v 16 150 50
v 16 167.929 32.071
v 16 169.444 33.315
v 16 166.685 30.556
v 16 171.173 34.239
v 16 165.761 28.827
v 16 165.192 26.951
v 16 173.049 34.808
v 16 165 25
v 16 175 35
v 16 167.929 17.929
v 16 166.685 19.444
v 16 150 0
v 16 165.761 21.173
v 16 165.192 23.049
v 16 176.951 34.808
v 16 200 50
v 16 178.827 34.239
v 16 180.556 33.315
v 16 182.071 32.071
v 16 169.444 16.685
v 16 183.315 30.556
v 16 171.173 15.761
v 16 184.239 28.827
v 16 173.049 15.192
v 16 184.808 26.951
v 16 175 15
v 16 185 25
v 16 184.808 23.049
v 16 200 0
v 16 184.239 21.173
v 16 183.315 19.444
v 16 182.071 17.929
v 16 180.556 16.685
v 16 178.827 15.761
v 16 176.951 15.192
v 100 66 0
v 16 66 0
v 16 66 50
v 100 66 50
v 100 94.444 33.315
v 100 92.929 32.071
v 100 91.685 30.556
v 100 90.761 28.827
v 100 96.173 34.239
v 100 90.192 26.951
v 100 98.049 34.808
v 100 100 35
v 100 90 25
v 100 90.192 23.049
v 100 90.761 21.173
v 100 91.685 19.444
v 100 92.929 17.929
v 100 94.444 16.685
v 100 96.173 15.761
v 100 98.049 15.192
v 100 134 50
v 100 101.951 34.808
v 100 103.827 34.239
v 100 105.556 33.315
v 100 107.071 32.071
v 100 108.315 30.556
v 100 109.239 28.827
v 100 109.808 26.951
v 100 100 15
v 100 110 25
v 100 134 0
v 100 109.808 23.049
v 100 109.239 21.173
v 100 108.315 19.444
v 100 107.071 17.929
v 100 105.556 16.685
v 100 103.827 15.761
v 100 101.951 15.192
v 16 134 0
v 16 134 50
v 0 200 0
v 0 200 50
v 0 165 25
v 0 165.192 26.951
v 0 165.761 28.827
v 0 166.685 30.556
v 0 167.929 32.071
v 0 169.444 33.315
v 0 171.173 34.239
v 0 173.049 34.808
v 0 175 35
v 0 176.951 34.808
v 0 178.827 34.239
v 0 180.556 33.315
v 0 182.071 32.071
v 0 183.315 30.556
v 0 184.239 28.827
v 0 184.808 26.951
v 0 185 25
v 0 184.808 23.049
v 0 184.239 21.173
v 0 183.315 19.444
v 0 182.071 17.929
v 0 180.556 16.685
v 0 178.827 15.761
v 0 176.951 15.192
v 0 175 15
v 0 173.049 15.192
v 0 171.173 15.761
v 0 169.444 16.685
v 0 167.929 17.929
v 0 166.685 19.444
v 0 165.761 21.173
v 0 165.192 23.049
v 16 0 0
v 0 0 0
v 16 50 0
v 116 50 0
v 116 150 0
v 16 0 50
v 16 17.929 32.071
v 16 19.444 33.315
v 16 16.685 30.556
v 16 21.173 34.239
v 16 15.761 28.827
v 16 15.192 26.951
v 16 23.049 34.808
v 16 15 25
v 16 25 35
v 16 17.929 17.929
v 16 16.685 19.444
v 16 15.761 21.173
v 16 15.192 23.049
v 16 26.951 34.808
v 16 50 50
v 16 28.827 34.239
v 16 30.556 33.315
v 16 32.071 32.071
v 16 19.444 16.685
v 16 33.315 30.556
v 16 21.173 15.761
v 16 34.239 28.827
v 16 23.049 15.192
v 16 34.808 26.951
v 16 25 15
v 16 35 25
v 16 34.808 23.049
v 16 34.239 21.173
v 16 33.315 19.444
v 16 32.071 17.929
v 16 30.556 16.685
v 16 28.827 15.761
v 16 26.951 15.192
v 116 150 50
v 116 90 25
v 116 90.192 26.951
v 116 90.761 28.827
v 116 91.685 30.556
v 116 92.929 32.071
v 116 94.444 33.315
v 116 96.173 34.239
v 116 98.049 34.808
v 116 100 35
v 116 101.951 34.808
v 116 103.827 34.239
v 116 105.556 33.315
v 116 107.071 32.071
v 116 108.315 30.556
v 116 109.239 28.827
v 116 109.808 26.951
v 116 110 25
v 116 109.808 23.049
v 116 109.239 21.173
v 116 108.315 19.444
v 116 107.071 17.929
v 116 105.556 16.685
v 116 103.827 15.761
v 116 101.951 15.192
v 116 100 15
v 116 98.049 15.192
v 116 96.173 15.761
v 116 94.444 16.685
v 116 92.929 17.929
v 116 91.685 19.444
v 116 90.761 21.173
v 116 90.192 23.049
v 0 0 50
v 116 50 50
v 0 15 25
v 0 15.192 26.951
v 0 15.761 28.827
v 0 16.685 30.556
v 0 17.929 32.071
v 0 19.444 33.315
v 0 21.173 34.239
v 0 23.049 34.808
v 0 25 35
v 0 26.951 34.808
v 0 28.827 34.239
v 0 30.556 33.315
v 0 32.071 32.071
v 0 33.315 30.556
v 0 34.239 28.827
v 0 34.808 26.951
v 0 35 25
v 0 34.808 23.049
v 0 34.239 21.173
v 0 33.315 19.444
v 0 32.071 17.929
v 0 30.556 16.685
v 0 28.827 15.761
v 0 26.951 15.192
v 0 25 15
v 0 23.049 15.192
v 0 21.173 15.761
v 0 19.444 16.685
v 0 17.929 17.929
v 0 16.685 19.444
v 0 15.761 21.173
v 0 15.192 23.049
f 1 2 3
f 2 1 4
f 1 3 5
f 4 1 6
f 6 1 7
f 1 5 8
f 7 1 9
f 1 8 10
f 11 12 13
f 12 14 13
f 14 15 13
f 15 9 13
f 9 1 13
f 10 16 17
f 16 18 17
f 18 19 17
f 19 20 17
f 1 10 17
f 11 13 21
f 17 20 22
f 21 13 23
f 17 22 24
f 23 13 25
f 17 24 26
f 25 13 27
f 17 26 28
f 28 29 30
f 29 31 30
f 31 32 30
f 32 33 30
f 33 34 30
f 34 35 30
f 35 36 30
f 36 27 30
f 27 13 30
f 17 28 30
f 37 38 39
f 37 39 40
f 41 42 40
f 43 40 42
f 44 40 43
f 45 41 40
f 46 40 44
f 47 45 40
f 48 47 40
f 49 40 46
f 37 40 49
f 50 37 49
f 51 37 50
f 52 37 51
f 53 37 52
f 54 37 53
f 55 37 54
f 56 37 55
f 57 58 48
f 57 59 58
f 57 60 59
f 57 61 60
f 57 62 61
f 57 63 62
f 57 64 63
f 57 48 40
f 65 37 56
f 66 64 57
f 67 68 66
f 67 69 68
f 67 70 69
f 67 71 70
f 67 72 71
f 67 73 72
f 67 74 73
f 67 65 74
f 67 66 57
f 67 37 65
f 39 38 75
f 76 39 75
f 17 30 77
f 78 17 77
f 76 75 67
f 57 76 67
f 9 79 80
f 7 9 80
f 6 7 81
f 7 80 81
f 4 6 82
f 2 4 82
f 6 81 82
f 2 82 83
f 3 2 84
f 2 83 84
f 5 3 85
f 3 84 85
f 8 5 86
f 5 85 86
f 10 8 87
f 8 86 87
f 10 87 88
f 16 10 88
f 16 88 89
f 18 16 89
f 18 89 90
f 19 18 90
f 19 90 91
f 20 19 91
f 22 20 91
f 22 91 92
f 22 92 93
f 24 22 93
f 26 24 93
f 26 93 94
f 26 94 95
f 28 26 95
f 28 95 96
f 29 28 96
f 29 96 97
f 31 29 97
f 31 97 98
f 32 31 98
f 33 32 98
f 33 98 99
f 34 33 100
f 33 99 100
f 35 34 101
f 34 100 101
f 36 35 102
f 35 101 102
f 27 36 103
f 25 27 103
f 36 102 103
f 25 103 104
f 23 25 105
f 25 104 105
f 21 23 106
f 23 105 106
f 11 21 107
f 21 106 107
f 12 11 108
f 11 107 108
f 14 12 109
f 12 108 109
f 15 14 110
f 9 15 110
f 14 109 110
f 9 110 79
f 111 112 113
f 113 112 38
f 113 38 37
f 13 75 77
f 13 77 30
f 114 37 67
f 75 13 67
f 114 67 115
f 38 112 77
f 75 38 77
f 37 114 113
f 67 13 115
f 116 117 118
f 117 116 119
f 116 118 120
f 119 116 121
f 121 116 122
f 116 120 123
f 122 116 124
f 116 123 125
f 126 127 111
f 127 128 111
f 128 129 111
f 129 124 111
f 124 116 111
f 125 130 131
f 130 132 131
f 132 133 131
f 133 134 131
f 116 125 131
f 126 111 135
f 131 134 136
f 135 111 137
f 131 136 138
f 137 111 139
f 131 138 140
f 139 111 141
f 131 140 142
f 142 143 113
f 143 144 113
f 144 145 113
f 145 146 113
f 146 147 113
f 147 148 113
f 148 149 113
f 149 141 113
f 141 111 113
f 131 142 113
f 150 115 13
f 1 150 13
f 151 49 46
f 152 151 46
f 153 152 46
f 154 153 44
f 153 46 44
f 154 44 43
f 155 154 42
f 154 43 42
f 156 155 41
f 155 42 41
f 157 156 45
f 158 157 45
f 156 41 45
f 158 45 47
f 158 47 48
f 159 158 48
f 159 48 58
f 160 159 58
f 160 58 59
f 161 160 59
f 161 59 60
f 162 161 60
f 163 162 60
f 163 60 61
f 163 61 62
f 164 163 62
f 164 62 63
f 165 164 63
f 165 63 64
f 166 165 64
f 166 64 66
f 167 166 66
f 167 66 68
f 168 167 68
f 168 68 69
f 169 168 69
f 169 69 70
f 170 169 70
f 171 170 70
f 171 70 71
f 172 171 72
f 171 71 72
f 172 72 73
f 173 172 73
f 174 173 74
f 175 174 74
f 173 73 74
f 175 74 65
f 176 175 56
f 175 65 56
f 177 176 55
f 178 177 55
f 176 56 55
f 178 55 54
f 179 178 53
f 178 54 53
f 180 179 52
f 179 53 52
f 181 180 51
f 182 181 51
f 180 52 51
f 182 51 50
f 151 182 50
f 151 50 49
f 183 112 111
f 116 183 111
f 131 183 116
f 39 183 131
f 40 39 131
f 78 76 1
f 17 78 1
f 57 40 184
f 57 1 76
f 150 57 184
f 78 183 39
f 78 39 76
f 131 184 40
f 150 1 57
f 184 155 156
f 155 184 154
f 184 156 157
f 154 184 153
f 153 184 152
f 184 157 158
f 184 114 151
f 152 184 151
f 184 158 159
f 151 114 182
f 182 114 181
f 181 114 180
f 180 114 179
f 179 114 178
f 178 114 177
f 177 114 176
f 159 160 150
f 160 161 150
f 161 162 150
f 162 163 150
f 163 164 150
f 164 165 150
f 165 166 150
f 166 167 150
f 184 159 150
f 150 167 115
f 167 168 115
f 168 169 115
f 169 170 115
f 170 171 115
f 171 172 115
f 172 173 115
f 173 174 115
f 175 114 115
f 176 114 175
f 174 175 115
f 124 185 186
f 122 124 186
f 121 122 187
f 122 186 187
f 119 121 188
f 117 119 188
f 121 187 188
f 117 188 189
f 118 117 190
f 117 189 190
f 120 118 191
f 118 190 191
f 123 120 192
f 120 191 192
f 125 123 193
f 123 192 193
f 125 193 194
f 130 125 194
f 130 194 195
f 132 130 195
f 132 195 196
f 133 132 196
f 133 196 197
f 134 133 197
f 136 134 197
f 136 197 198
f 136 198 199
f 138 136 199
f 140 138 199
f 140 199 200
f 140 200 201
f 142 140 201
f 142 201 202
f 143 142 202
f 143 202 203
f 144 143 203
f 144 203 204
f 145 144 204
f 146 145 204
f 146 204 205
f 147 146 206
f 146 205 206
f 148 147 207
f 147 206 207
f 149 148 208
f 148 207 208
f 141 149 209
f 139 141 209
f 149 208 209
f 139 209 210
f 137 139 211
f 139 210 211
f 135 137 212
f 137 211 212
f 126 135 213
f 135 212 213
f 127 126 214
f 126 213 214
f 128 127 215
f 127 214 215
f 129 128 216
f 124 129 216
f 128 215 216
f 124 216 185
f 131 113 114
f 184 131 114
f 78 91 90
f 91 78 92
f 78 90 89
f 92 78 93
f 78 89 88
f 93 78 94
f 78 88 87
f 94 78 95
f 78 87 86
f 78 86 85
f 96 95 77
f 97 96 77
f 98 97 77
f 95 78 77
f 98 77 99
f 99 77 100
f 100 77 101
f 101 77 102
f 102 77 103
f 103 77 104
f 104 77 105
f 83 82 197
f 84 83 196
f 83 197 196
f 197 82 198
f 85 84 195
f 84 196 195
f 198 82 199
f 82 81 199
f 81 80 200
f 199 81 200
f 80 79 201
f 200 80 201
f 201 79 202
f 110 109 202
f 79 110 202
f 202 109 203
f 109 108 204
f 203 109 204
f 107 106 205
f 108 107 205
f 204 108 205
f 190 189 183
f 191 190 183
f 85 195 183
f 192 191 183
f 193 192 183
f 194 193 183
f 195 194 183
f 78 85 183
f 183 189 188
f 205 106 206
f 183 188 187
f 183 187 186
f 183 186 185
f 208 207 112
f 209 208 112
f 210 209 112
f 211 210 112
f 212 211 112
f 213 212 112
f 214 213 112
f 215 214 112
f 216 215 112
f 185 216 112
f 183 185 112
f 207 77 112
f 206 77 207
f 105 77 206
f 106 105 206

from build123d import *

# Parameters (mm, degrees)
F0_W     = 84
F0_H     = 68
F1_DEPTH = 50
F4_D     = 20
F5_D     = 20
F5_DEPTH = 50


with BuildPart() as f1:
    # F0 (on Top) → F1 (new body)
    with BuildSketch(Plane.XY):
        Polygon((0, 200), (0, 0), (16, 0), (16, 50), (116, 50), (116, 150), (16, 150), (16, 200), align=None)
        with Locations((58, 100)):
            Rectangle(F0_W, F0_H, mode=Mode.SUBTRACT)
    extrude(amount=F1_DEPTH)

    # F4 (through all)
    with Locations(Plane.YZ.offset(16)):
        with Locations((25, 25), (175, 25)):
            Hole(F4_D / 2)

    # F5
    with Locations(Plane.YZ.offset(116)):
        with Locations((100, 25)):
            Hole(F5_D / 2, depth=F5_DEPTH)


solid = f1.part
